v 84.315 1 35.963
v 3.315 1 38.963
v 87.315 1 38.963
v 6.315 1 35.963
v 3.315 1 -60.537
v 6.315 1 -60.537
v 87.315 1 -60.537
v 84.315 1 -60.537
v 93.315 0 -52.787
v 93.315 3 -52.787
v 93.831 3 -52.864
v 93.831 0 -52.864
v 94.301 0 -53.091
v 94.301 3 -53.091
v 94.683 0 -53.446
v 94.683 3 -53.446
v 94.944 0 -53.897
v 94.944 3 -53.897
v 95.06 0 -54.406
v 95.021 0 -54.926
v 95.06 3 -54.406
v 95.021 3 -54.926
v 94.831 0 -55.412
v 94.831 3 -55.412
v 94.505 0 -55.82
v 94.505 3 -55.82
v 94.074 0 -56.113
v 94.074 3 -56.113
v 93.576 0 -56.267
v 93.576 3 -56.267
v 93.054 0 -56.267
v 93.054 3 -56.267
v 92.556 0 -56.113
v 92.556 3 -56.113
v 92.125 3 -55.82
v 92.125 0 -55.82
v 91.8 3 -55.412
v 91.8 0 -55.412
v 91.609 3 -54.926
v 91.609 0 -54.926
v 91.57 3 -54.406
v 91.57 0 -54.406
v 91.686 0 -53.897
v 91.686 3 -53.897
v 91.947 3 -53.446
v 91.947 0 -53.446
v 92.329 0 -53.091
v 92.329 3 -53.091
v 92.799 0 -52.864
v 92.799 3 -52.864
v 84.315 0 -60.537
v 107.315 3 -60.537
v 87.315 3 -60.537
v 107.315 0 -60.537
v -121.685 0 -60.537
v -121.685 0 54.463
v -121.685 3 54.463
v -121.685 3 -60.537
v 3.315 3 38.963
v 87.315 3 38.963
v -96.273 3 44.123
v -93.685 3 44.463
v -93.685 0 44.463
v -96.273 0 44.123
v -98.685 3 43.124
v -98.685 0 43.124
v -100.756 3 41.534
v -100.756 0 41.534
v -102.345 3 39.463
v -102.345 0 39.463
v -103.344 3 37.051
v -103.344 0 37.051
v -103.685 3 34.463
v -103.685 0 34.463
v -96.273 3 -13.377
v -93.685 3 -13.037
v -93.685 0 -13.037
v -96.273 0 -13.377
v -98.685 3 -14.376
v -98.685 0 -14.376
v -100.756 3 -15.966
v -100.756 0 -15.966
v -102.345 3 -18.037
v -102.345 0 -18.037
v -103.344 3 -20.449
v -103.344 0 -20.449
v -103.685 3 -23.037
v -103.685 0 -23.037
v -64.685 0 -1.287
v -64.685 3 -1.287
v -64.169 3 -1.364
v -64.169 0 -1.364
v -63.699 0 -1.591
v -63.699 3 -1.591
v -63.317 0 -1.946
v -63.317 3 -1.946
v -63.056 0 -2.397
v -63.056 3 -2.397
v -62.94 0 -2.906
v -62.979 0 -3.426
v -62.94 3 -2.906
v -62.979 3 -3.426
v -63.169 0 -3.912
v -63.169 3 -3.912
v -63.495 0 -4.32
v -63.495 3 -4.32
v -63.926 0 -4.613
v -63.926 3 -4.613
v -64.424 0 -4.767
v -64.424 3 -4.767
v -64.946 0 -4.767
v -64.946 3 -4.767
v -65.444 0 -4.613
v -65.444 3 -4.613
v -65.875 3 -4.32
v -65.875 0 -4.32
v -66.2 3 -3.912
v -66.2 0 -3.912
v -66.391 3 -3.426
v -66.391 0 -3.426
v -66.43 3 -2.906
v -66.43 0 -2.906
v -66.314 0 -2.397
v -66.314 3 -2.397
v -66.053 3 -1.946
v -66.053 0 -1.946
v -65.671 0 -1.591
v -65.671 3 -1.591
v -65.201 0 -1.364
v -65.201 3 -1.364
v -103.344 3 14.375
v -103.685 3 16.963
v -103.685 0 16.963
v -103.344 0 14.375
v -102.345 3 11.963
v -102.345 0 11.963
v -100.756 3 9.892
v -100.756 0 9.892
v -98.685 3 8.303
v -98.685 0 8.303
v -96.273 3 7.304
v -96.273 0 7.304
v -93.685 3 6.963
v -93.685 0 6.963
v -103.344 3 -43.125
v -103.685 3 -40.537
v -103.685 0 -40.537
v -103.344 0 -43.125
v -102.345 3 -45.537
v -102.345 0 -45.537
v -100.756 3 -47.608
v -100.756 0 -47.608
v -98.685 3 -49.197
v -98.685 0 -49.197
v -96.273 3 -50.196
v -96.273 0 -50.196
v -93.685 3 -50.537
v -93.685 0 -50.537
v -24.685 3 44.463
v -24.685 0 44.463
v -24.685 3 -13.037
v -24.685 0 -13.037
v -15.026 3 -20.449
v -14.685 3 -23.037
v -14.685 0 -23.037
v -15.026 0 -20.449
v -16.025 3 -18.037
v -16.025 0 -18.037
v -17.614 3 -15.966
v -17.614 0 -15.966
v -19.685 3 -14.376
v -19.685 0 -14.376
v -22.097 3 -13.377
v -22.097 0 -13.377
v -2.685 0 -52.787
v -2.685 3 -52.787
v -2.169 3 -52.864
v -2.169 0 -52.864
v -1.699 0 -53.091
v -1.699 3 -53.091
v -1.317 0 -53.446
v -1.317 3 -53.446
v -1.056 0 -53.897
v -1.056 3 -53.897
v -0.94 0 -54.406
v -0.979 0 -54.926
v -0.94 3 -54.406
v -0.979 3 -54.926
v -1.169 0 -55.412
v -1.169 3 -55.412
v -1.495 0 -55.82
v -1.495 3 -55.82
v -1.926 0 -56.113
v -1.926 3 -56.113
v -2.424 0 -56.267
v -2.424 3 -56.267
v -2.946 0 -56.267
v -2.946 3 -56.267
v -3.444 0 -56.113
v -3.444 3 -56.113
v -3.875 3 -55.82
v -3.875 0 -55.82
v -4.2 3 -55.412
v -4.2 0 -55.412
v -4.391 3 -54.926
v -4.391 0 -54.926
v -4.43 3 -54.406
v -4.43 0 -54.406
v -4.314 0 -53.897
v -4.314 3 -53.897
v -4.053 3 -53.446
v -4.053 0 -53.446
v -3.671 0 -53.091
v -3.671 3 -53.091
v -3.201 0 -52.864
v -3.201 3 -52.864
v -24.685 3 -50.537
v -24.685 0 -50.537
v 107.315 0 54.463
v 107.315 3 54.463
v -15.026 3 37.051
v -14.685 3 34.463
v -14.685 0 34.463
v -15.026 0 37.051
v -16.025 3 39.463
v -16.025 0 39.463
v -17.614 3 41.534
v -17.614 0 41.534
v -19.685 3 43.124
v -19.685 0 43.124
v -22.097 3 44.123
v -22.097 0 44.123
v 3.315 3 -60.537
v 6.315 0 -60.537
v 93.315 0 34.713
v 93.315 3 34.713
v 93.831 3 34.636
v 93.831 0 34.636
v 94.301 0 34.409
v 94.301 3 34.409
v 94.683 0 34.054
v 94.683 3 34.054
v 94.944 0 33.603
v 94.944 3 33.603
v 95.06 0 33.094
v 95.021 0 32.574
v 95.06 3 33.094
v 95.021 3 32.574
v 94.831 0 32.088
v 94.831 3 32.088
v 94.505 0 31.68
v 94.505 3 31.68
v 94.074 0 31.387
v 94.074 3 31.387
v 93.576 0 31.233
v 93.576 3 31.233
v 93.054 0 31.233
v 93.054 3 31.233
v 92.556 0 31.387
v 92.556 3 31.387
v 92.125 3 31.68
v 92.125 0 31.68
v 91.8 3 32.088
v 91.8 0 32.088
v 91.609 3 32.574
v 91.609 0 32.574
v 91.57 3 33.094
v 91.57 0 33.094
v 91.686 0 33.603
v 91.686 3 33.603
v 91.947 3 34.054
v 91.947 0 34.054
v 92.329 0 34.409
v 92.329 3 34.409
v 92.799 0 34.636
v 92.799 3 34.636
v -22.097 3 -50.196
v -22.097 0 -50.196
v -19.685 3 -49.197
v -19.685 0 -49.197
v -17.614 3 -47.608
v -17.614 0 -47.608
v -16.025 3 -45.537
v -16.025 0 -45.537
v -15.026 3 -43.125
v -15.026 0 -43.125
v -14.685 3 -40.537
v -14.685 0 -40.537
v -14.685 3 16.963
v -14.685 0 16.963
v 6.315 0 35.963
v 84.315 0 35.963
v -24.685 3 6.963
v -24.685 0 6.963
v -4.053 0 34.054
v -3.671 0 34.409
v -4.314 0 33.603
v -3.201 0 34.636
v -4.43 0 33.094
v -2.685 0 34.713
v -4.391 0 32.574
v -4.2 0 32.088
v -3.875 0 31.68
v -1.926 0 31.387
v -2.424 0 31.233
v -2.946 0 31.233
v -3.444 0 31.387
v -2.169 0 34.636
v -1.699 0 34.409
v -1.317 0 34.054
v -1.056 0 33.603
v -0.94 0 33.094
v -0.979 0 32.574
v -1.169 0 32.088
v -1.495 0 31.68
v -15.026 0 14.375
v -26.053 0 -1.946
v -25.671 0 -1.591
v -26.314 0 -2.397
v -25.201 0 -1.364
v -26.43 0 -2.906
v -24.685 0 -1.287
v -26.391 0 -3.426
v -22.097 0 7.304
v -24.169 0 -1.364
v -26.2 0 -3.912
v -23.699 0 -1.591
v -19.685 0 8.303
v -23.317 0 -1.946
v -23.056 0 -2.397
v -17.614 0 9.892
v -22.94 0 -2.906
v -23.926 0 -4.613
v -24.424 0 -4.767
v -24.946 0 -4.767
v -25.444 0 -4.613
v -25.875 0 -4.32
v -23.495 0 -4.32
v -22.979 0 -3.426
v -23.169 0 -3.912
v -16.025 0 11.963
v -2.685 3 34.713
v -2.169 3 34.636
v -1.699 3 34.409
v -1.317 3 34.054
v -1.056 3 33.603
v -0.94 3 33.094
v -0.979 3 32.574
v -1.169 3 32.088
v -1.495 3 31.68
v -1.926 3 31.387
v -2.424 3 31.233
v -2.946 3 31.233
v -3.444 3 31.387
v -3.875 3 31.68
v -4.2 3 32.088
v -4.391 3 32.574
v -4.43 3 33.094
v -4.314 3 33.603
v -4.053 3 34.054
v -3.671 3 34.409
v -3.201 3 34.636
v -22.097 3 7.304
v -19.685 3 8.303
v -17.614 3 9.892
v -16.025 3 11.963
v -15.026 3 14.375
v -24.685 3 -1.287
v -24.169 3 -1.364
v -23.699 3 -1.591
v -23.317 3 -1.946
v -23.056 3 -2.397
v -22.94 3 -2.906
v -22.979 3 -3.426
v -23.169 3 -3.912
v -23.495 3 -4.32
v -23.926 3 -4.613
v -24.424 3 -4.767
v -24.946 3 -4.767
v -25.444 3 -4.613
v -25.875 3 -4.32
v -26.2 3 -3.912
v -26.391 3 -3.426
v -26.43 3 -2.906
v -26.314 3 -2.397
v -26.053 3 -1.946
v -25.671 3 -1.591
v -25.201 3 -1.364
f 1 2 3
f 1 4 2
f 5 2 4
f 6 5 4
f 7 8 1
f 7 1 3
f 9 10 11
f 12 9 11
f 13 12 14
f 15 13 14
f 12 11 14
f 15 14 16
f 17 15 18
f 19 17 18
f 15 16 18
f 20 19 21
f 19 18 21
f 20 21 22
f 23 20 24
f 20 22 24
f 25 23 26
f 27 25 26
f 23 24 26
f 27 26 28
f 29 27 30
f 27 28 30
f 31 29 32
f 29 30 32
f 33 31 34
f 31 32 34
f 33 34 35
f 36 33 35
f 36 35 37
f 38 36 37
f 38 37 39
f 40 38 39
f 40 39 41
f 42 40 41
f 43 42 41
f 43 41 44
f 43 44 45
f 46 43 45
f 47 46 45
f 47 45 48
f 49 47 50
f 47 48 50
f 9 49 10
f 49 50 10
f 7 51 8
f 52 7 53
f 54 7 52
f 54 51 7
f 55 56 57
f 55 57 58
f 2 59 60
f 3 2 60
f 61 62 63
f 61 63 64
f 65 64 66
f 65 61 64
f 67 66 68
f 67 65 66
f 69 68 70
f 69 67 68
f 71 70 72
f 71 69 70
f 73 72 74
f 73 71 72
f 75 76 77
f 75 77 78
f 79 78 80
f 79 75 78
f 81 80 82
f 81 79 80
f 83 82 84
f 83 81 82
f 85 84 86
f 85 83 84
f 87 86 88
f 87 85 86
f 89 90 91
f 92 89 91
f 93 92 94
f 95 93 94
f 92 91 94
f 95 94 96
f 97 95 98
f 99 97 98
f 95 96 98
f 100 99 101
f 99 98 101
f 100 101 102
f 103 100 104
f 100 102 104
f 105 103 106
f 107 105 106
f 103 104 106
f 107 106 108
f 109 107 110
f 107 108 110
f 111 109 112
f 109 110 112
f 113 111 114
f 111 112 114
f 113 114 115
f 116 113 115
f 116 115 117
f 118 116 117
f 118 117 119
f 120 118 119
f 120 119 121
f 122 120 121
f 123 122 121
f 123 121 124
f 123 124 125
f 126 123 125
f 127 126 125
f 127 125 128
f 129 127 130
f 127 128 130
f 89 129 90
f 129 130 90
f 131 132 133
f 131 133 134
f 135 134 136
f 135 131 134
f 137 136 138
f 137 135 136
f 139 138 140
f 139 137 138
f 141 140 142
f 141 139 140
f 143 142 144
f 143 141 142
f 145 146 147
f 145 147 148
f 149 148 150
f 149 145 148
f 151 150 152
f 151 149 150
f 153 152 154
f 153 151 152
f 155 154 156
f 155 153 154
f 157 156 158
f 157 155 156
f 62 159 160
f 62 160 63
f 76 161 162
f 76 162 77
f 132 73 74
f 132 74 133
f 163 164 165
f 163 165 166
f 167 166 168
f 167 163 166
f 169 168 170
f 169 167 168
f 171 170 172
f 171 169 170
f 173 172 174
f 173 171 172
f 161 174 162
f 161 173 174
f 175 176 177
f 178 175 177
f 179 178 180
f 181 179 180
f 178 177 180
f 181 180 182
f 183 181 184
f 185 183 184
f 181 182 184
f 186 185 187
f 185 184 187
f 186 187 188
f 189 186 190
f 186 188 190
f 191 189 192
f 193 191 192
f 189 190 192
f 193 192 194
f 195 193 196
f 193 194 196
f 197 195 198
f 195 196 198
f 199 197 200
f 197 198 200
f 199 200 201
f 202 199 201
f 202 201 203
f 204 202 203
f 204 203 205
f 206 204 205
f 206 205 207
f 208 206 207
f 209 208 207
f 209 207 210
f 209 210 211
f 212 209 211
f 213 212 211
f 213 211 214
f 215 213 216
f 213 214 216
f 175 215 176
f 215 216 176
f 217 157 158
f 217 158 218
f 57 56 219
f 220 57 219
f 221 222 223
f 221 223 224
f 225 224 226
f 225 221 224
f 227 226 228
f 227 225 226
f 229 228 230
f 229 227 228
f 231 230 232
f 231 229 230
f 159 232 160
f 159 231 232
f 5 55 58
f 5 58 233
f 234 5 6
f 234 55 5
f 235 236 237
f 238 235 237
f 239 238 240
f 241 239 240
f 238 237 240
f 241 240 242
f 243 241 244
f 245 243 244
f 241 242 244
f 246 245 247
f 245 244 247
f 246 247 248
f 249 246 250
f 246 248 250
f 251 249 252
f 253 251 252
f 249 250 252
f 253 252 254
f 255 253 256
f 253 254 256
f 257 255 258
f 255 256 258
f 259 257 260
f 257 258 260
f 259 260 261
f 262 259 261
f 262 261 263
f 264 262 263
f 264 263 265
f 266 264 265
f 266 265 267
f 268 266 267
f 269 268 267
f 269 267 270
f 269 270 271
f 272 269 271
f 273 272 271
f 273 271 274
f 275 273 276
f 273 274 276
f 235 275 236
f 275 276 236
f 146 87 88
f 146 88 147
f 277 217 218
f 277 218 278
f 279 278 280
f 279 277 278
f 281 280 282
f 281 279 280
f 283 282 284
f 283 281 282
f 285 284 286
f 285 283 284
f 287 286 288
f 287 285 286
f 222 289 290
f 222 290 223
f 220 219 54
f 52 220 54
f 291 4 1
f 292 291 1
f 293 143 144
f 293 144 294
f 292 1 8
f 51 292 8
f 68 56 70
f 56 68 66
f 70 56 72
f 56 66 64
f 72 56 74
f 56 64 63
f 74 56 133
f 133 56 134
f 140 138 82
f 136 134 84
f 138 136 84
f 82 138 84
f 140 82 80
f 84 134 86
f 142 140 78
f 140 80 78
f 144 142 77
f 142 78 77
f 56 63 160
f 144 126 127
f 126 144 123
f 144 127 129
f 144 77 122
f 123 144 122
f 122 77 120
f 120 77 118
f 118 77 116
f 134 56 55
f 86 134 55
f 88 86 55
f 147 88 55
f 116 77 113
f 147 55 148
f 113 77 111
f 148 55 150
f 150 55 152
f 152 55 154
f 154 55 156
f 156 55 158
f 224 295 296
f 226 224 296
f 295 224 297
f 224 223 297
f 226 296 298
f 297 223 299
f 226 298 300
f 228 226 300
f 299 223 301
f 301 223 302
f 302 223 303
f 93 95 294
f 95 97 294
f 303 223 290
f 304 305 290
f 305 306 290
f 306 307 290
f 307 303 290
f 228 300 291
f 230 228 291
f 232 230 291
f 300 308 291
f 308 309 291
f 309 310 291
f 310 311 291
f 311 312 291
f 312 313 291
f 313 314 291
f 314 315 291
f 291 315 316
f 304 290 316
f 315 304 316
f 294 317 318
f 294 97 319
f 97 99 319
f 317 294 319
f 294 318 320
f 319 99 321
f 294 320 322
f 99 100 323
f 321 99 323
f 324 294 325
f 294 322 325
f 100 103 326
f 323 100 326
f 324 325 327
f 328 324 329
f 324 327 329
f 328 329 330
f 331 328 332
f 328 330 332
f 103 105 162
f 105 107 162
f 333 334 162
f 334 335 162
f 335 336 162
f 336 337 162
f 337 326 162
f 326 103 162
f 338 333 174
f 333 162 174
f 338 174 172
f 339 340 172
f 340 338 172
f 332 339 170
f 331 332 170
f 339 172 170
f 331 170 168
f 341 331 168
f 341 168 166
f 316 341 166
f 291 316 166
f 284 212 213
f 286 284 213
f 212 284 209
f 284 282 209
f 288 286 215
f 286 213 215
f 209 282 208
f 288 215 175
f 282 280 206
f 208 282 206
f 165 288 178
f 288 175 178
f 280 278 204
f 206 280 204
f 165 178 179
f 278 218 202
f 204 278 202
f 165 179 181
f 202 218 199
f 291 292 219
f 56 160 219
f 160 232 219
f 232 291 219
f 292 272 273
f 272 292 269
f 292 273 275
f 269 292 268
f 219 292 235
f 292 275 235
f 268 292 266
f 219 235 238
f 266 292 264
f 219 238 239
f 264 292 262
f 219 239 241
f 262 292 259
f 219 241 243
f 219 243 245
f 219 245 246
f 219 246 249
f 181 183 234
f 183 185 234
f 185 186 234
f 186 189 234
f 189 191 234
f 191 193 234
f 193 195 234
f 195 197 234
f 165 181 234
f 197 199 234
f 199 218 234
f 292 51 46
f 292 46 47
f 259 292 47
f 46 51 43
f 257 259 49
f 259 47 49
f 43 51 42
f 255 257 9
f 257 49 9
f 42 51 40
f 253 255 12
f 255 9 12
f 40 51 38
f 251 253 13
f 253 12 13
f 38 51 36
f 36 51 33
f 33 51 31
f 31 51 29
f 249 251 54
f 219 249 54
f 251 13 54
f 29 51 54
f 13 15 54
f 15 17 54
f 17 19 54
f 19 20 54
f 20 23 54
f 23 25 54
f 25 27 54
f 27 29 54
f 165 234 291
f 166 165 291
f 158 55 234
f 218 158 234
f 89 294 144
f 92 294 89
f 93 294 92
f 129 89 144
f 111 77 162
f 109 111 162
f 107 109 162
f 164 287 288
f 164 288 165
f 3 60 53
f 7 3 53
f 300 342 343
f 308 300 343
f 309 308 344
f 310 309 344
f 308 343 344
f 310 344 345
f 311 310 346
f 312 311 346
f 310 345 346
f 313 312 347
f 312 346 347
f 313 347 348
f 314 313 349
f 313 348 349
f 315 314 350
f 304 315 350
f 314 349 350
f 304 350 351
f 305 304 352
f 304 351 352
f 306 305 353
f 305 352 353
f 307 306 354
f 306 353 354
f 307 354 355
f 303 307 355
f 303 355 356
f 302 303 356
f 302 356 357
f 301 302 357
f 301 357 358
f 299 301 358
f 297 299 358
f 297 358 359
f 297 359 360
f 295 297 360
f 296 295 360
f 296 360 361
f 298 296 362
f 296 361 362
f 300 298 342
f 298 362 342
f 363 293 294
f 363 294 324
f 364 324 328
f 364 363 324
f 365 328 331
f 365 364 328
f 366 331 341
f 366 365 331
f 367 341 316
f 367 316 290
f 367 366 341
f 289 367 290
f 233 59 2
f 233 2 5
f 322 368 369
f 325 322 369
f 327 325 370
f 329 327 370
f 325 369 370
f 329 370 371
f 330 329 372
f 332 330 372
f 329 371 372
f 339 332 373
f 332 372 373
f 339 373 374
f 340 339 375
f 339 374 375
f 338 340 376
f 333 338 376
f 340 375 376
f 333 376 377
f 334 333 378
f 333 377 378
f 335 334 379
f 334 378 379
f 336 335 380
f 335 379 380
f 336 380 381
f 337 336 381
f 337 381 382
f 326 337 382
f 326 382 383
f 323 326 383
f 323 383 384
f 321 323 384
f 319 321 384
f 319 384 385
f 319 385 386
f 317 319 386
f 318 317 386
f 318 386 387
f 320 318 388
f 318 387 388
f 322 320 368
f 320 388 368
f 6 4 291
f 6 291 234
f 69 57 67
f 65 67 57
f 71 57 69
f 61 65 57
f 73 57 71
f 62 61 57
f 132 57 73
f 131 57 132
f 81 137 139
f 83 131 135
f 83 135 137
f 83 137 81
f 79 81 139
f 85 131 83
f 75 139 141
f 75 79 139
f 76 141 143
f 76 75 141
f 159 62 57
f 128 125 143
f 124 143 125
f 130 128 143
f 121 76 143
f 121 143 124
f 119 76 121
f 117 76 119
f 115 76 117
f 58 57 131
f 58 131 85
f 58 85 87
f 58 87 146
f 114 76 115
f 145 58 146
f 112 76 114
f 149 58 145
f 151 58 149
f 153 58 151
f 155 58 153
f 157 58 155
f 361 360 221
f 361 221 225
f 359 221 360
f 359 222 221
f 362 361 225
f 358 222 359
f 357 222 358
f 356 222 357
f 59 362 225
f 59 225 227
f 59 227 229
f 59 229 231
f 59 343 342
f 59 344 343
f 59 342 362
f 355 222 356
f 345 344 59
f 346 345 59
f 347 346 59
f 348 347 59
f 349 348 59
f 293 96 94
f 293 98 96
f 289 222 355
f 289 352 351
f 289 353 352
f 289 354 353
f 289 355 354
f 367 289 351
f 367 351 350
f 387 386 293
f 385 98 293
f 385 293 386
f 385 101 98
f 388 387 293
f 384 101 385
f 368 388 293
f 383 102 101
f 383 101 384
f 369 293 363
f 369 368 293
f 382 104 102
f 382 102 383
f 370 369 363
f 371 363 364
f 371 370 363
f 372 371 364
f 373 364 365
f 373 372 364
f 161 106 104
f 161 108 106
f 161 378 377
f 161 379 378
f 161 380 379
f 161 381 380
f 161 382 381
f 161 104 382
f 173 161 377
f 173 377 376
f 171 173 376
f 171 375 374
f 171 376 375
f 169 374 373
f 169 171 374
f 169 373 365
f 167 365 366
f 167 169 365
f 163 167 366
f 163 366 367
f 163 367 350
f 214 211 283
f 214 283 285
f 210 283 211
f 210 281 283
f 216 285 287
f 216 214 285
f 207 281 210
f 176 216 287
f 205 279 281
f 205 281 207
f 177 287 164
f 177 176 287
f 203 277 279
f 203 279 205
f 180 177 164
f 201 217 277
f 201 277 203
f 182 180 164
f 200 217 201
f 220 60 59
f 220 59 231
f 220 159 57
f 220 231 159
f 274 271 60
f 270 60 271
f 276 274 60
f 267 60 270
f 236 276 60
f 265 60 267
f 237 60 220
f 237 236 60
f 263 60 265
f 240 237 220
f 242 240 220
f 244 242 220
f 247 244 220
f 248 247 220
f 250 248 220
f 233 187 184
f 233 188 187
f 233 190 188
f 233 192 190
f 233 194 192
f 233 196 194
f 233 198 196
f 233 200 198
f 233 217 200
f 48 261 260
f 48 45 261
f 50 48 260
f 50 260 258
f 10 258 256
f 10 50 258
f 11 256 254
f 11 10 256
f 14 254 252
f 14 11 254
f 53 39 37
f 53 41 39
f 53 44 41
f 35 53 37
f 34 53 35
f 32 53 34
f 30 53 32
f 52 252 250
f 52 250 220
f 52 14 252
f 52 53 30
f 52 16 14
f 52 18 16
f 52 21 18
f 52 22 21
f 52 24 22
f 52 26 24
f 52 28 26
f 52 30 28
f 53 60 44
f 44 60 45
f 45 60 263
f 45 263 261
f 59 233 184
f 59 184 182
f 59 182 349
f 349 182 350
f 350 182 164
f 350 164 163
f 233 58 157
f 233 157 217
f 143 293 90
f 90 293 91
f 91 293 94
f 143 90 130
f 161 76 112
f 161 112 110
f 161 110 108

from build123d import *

# Parameters (mm, degrees)
SKETCH_1_W          = 229
SKETCH_1_H          = 115
EXTRUDE_1_DEPTH     = 3
SKETCH_2_W          = 84
SKETCH_2_H          = 99.5
CUT_EXTRUDE_2_DEPTH = 2
SKETCH_4_W          = 78
SKETCH_4_H          = 96.5
CUT_EXTRUDE_3_DEPTH = 2
SKETCH_5_R          = 1.75
CUT_EXTRUDE_4_DEPTH = 3


with BuildPart() as part:
    # 草图1 → 凸台-拉伸1 (new body)
    with BuildSketch(Plane(origin=(0, 0, 0), x_dir=(1, 0, 0), z_dir=(0, 1, 0))):
        with Locations((-7.184913218, 3.036715621)):
            Rectangle(SKETCH_1_W, SKETCH_1_H)
    extrude(amount=EXTRUDE_1_DEPTH)

    # 草图2 → 切除-拉伸2 (cut)
    with BuildSketch(Plane(origin=(0, 3, 0), x_dir=(1, 0, 0), z_dir=(0, 1, 0))):
        with Locations((45.315086782, 10.786715621)):
            Rectangle(SKETCH_2_W, SKETCH_2_H)
    extrude(amount=-CUT_EXTRUDE_2_DEPTH, mode=Mode.SUBTRACT)

    # 草图4 → 切除-拉伸3 (cut)
    with BuildSketch(Plane(origin=(0, 1, 0), x_dir=(1, 0, 0), z_dir=(0, 1, 0))):
        with Locations((45.315086782, 12.286715621)):
            Rectangle(SKETCH_4_W, SKETCH_4_H)
    extrude(amount=-CUT_EXTRUDE_3_DEPTH, mode=Mode.SUBTRACT)

    # 草图5 → 切除-拉伸4 (cut)
    with BuildSketch(Plane(origin=(0, 3, 0), x_dir=(1, 0, 0), z_dir=(0, 1, 0))):
        with Locations(Location((-64.684913218, 3.036715621, 0), (0, 0, 270))):
            Circle(SKETCH_5_R)
        with Locations(Location((-24.684913218, 3.036715621, 0), (0, 0, 270))):
            Circle(SKETCH_5_R)
        with Locations(Location((-2.684913218, 54.536715621, 0), (0, 0, 270))):
            Circle(SKETCH_5_R)
        with Locations(Location((93.315086782, 54.536715621, 0), (0, 0, 270))):
            Circle(SKETCH_5_R)
        with Locations(Location((93.315086782, -32.963284379, 0), (0, 0, 270))):
            Circle(SKETCH_5_R)
        with Locations(Location((-2.684913218, -32.963284379, 0), (0, 0, 270))):
            Circle(SKETCH_5_R)
        with BuildLine():
            Line((-93.684913218, 50.536715621), (-24.684913218, 50.536715621))
            ThreePointArc((-24.684913218, 50.536715621), (-17.613845406, 47.607783433), (-14.684913218, 40.536715621))
            Line((-14.684913218, 40.536715621), (-14.684913218, 23.036715621))
            ThreePointArc((-14.684913218, 23.036715621), (-17.613845406, 15.965647809), (-24.684913218, 13.036715621))
            Line((-24.684913218, 13.036715621), (-93.684913218, 13.036715621))
            ThreePointArc((-93.684913218, 13.036715621), (-100.755981029, 15.965647809), (-103.684913218, 23.036715621))
            Line((-103.684913218, 23.036715621), (-103.684913218, 40.536715621))
            ThreePointArc((-103.684913218, 40.536715621), (-100.755981029, 47.607783433), (-93.684913218, 50.536715621))
        make_face()
        with BuildLine():
            Line((-93.684913218, -6.963284379), (-24.684913218, -6.963284379))
            ThreePointArc((-24.684913218, -6.963284379), (-17.613845406, -9.892216567), (-14.684913218, -16.963284379))
            Line((-14.684913218, -16.963284379), (-14.684913218, -34.463284379))
            ThreePointArc((-14.684913218, -34.463284379), (-17.613845406, -41.534352191), (-24.684913218, -44.463284379))
            Line((-24.684913218, -44.463284379), (-93.684913218, -44.463284379))
            ThreePointArc((-93.684913218, -44.463284379), (-100.755981029, -41.534352191), (-103.684913218, -34.463284379))
            Line((-103.684913218, -34.463284379), (-103.684913218, -16.963284379))
            ThreePointArc((-103.684913218, -16.963284379), (-100.755981029, -9.892216567), (-93.684913218, -6.963284379))
        make_face()
    extrude(amount=-CUT_EXTRUDE_4_DEPTH, mode=Mode.SUBTRACT)


solid = part.part
